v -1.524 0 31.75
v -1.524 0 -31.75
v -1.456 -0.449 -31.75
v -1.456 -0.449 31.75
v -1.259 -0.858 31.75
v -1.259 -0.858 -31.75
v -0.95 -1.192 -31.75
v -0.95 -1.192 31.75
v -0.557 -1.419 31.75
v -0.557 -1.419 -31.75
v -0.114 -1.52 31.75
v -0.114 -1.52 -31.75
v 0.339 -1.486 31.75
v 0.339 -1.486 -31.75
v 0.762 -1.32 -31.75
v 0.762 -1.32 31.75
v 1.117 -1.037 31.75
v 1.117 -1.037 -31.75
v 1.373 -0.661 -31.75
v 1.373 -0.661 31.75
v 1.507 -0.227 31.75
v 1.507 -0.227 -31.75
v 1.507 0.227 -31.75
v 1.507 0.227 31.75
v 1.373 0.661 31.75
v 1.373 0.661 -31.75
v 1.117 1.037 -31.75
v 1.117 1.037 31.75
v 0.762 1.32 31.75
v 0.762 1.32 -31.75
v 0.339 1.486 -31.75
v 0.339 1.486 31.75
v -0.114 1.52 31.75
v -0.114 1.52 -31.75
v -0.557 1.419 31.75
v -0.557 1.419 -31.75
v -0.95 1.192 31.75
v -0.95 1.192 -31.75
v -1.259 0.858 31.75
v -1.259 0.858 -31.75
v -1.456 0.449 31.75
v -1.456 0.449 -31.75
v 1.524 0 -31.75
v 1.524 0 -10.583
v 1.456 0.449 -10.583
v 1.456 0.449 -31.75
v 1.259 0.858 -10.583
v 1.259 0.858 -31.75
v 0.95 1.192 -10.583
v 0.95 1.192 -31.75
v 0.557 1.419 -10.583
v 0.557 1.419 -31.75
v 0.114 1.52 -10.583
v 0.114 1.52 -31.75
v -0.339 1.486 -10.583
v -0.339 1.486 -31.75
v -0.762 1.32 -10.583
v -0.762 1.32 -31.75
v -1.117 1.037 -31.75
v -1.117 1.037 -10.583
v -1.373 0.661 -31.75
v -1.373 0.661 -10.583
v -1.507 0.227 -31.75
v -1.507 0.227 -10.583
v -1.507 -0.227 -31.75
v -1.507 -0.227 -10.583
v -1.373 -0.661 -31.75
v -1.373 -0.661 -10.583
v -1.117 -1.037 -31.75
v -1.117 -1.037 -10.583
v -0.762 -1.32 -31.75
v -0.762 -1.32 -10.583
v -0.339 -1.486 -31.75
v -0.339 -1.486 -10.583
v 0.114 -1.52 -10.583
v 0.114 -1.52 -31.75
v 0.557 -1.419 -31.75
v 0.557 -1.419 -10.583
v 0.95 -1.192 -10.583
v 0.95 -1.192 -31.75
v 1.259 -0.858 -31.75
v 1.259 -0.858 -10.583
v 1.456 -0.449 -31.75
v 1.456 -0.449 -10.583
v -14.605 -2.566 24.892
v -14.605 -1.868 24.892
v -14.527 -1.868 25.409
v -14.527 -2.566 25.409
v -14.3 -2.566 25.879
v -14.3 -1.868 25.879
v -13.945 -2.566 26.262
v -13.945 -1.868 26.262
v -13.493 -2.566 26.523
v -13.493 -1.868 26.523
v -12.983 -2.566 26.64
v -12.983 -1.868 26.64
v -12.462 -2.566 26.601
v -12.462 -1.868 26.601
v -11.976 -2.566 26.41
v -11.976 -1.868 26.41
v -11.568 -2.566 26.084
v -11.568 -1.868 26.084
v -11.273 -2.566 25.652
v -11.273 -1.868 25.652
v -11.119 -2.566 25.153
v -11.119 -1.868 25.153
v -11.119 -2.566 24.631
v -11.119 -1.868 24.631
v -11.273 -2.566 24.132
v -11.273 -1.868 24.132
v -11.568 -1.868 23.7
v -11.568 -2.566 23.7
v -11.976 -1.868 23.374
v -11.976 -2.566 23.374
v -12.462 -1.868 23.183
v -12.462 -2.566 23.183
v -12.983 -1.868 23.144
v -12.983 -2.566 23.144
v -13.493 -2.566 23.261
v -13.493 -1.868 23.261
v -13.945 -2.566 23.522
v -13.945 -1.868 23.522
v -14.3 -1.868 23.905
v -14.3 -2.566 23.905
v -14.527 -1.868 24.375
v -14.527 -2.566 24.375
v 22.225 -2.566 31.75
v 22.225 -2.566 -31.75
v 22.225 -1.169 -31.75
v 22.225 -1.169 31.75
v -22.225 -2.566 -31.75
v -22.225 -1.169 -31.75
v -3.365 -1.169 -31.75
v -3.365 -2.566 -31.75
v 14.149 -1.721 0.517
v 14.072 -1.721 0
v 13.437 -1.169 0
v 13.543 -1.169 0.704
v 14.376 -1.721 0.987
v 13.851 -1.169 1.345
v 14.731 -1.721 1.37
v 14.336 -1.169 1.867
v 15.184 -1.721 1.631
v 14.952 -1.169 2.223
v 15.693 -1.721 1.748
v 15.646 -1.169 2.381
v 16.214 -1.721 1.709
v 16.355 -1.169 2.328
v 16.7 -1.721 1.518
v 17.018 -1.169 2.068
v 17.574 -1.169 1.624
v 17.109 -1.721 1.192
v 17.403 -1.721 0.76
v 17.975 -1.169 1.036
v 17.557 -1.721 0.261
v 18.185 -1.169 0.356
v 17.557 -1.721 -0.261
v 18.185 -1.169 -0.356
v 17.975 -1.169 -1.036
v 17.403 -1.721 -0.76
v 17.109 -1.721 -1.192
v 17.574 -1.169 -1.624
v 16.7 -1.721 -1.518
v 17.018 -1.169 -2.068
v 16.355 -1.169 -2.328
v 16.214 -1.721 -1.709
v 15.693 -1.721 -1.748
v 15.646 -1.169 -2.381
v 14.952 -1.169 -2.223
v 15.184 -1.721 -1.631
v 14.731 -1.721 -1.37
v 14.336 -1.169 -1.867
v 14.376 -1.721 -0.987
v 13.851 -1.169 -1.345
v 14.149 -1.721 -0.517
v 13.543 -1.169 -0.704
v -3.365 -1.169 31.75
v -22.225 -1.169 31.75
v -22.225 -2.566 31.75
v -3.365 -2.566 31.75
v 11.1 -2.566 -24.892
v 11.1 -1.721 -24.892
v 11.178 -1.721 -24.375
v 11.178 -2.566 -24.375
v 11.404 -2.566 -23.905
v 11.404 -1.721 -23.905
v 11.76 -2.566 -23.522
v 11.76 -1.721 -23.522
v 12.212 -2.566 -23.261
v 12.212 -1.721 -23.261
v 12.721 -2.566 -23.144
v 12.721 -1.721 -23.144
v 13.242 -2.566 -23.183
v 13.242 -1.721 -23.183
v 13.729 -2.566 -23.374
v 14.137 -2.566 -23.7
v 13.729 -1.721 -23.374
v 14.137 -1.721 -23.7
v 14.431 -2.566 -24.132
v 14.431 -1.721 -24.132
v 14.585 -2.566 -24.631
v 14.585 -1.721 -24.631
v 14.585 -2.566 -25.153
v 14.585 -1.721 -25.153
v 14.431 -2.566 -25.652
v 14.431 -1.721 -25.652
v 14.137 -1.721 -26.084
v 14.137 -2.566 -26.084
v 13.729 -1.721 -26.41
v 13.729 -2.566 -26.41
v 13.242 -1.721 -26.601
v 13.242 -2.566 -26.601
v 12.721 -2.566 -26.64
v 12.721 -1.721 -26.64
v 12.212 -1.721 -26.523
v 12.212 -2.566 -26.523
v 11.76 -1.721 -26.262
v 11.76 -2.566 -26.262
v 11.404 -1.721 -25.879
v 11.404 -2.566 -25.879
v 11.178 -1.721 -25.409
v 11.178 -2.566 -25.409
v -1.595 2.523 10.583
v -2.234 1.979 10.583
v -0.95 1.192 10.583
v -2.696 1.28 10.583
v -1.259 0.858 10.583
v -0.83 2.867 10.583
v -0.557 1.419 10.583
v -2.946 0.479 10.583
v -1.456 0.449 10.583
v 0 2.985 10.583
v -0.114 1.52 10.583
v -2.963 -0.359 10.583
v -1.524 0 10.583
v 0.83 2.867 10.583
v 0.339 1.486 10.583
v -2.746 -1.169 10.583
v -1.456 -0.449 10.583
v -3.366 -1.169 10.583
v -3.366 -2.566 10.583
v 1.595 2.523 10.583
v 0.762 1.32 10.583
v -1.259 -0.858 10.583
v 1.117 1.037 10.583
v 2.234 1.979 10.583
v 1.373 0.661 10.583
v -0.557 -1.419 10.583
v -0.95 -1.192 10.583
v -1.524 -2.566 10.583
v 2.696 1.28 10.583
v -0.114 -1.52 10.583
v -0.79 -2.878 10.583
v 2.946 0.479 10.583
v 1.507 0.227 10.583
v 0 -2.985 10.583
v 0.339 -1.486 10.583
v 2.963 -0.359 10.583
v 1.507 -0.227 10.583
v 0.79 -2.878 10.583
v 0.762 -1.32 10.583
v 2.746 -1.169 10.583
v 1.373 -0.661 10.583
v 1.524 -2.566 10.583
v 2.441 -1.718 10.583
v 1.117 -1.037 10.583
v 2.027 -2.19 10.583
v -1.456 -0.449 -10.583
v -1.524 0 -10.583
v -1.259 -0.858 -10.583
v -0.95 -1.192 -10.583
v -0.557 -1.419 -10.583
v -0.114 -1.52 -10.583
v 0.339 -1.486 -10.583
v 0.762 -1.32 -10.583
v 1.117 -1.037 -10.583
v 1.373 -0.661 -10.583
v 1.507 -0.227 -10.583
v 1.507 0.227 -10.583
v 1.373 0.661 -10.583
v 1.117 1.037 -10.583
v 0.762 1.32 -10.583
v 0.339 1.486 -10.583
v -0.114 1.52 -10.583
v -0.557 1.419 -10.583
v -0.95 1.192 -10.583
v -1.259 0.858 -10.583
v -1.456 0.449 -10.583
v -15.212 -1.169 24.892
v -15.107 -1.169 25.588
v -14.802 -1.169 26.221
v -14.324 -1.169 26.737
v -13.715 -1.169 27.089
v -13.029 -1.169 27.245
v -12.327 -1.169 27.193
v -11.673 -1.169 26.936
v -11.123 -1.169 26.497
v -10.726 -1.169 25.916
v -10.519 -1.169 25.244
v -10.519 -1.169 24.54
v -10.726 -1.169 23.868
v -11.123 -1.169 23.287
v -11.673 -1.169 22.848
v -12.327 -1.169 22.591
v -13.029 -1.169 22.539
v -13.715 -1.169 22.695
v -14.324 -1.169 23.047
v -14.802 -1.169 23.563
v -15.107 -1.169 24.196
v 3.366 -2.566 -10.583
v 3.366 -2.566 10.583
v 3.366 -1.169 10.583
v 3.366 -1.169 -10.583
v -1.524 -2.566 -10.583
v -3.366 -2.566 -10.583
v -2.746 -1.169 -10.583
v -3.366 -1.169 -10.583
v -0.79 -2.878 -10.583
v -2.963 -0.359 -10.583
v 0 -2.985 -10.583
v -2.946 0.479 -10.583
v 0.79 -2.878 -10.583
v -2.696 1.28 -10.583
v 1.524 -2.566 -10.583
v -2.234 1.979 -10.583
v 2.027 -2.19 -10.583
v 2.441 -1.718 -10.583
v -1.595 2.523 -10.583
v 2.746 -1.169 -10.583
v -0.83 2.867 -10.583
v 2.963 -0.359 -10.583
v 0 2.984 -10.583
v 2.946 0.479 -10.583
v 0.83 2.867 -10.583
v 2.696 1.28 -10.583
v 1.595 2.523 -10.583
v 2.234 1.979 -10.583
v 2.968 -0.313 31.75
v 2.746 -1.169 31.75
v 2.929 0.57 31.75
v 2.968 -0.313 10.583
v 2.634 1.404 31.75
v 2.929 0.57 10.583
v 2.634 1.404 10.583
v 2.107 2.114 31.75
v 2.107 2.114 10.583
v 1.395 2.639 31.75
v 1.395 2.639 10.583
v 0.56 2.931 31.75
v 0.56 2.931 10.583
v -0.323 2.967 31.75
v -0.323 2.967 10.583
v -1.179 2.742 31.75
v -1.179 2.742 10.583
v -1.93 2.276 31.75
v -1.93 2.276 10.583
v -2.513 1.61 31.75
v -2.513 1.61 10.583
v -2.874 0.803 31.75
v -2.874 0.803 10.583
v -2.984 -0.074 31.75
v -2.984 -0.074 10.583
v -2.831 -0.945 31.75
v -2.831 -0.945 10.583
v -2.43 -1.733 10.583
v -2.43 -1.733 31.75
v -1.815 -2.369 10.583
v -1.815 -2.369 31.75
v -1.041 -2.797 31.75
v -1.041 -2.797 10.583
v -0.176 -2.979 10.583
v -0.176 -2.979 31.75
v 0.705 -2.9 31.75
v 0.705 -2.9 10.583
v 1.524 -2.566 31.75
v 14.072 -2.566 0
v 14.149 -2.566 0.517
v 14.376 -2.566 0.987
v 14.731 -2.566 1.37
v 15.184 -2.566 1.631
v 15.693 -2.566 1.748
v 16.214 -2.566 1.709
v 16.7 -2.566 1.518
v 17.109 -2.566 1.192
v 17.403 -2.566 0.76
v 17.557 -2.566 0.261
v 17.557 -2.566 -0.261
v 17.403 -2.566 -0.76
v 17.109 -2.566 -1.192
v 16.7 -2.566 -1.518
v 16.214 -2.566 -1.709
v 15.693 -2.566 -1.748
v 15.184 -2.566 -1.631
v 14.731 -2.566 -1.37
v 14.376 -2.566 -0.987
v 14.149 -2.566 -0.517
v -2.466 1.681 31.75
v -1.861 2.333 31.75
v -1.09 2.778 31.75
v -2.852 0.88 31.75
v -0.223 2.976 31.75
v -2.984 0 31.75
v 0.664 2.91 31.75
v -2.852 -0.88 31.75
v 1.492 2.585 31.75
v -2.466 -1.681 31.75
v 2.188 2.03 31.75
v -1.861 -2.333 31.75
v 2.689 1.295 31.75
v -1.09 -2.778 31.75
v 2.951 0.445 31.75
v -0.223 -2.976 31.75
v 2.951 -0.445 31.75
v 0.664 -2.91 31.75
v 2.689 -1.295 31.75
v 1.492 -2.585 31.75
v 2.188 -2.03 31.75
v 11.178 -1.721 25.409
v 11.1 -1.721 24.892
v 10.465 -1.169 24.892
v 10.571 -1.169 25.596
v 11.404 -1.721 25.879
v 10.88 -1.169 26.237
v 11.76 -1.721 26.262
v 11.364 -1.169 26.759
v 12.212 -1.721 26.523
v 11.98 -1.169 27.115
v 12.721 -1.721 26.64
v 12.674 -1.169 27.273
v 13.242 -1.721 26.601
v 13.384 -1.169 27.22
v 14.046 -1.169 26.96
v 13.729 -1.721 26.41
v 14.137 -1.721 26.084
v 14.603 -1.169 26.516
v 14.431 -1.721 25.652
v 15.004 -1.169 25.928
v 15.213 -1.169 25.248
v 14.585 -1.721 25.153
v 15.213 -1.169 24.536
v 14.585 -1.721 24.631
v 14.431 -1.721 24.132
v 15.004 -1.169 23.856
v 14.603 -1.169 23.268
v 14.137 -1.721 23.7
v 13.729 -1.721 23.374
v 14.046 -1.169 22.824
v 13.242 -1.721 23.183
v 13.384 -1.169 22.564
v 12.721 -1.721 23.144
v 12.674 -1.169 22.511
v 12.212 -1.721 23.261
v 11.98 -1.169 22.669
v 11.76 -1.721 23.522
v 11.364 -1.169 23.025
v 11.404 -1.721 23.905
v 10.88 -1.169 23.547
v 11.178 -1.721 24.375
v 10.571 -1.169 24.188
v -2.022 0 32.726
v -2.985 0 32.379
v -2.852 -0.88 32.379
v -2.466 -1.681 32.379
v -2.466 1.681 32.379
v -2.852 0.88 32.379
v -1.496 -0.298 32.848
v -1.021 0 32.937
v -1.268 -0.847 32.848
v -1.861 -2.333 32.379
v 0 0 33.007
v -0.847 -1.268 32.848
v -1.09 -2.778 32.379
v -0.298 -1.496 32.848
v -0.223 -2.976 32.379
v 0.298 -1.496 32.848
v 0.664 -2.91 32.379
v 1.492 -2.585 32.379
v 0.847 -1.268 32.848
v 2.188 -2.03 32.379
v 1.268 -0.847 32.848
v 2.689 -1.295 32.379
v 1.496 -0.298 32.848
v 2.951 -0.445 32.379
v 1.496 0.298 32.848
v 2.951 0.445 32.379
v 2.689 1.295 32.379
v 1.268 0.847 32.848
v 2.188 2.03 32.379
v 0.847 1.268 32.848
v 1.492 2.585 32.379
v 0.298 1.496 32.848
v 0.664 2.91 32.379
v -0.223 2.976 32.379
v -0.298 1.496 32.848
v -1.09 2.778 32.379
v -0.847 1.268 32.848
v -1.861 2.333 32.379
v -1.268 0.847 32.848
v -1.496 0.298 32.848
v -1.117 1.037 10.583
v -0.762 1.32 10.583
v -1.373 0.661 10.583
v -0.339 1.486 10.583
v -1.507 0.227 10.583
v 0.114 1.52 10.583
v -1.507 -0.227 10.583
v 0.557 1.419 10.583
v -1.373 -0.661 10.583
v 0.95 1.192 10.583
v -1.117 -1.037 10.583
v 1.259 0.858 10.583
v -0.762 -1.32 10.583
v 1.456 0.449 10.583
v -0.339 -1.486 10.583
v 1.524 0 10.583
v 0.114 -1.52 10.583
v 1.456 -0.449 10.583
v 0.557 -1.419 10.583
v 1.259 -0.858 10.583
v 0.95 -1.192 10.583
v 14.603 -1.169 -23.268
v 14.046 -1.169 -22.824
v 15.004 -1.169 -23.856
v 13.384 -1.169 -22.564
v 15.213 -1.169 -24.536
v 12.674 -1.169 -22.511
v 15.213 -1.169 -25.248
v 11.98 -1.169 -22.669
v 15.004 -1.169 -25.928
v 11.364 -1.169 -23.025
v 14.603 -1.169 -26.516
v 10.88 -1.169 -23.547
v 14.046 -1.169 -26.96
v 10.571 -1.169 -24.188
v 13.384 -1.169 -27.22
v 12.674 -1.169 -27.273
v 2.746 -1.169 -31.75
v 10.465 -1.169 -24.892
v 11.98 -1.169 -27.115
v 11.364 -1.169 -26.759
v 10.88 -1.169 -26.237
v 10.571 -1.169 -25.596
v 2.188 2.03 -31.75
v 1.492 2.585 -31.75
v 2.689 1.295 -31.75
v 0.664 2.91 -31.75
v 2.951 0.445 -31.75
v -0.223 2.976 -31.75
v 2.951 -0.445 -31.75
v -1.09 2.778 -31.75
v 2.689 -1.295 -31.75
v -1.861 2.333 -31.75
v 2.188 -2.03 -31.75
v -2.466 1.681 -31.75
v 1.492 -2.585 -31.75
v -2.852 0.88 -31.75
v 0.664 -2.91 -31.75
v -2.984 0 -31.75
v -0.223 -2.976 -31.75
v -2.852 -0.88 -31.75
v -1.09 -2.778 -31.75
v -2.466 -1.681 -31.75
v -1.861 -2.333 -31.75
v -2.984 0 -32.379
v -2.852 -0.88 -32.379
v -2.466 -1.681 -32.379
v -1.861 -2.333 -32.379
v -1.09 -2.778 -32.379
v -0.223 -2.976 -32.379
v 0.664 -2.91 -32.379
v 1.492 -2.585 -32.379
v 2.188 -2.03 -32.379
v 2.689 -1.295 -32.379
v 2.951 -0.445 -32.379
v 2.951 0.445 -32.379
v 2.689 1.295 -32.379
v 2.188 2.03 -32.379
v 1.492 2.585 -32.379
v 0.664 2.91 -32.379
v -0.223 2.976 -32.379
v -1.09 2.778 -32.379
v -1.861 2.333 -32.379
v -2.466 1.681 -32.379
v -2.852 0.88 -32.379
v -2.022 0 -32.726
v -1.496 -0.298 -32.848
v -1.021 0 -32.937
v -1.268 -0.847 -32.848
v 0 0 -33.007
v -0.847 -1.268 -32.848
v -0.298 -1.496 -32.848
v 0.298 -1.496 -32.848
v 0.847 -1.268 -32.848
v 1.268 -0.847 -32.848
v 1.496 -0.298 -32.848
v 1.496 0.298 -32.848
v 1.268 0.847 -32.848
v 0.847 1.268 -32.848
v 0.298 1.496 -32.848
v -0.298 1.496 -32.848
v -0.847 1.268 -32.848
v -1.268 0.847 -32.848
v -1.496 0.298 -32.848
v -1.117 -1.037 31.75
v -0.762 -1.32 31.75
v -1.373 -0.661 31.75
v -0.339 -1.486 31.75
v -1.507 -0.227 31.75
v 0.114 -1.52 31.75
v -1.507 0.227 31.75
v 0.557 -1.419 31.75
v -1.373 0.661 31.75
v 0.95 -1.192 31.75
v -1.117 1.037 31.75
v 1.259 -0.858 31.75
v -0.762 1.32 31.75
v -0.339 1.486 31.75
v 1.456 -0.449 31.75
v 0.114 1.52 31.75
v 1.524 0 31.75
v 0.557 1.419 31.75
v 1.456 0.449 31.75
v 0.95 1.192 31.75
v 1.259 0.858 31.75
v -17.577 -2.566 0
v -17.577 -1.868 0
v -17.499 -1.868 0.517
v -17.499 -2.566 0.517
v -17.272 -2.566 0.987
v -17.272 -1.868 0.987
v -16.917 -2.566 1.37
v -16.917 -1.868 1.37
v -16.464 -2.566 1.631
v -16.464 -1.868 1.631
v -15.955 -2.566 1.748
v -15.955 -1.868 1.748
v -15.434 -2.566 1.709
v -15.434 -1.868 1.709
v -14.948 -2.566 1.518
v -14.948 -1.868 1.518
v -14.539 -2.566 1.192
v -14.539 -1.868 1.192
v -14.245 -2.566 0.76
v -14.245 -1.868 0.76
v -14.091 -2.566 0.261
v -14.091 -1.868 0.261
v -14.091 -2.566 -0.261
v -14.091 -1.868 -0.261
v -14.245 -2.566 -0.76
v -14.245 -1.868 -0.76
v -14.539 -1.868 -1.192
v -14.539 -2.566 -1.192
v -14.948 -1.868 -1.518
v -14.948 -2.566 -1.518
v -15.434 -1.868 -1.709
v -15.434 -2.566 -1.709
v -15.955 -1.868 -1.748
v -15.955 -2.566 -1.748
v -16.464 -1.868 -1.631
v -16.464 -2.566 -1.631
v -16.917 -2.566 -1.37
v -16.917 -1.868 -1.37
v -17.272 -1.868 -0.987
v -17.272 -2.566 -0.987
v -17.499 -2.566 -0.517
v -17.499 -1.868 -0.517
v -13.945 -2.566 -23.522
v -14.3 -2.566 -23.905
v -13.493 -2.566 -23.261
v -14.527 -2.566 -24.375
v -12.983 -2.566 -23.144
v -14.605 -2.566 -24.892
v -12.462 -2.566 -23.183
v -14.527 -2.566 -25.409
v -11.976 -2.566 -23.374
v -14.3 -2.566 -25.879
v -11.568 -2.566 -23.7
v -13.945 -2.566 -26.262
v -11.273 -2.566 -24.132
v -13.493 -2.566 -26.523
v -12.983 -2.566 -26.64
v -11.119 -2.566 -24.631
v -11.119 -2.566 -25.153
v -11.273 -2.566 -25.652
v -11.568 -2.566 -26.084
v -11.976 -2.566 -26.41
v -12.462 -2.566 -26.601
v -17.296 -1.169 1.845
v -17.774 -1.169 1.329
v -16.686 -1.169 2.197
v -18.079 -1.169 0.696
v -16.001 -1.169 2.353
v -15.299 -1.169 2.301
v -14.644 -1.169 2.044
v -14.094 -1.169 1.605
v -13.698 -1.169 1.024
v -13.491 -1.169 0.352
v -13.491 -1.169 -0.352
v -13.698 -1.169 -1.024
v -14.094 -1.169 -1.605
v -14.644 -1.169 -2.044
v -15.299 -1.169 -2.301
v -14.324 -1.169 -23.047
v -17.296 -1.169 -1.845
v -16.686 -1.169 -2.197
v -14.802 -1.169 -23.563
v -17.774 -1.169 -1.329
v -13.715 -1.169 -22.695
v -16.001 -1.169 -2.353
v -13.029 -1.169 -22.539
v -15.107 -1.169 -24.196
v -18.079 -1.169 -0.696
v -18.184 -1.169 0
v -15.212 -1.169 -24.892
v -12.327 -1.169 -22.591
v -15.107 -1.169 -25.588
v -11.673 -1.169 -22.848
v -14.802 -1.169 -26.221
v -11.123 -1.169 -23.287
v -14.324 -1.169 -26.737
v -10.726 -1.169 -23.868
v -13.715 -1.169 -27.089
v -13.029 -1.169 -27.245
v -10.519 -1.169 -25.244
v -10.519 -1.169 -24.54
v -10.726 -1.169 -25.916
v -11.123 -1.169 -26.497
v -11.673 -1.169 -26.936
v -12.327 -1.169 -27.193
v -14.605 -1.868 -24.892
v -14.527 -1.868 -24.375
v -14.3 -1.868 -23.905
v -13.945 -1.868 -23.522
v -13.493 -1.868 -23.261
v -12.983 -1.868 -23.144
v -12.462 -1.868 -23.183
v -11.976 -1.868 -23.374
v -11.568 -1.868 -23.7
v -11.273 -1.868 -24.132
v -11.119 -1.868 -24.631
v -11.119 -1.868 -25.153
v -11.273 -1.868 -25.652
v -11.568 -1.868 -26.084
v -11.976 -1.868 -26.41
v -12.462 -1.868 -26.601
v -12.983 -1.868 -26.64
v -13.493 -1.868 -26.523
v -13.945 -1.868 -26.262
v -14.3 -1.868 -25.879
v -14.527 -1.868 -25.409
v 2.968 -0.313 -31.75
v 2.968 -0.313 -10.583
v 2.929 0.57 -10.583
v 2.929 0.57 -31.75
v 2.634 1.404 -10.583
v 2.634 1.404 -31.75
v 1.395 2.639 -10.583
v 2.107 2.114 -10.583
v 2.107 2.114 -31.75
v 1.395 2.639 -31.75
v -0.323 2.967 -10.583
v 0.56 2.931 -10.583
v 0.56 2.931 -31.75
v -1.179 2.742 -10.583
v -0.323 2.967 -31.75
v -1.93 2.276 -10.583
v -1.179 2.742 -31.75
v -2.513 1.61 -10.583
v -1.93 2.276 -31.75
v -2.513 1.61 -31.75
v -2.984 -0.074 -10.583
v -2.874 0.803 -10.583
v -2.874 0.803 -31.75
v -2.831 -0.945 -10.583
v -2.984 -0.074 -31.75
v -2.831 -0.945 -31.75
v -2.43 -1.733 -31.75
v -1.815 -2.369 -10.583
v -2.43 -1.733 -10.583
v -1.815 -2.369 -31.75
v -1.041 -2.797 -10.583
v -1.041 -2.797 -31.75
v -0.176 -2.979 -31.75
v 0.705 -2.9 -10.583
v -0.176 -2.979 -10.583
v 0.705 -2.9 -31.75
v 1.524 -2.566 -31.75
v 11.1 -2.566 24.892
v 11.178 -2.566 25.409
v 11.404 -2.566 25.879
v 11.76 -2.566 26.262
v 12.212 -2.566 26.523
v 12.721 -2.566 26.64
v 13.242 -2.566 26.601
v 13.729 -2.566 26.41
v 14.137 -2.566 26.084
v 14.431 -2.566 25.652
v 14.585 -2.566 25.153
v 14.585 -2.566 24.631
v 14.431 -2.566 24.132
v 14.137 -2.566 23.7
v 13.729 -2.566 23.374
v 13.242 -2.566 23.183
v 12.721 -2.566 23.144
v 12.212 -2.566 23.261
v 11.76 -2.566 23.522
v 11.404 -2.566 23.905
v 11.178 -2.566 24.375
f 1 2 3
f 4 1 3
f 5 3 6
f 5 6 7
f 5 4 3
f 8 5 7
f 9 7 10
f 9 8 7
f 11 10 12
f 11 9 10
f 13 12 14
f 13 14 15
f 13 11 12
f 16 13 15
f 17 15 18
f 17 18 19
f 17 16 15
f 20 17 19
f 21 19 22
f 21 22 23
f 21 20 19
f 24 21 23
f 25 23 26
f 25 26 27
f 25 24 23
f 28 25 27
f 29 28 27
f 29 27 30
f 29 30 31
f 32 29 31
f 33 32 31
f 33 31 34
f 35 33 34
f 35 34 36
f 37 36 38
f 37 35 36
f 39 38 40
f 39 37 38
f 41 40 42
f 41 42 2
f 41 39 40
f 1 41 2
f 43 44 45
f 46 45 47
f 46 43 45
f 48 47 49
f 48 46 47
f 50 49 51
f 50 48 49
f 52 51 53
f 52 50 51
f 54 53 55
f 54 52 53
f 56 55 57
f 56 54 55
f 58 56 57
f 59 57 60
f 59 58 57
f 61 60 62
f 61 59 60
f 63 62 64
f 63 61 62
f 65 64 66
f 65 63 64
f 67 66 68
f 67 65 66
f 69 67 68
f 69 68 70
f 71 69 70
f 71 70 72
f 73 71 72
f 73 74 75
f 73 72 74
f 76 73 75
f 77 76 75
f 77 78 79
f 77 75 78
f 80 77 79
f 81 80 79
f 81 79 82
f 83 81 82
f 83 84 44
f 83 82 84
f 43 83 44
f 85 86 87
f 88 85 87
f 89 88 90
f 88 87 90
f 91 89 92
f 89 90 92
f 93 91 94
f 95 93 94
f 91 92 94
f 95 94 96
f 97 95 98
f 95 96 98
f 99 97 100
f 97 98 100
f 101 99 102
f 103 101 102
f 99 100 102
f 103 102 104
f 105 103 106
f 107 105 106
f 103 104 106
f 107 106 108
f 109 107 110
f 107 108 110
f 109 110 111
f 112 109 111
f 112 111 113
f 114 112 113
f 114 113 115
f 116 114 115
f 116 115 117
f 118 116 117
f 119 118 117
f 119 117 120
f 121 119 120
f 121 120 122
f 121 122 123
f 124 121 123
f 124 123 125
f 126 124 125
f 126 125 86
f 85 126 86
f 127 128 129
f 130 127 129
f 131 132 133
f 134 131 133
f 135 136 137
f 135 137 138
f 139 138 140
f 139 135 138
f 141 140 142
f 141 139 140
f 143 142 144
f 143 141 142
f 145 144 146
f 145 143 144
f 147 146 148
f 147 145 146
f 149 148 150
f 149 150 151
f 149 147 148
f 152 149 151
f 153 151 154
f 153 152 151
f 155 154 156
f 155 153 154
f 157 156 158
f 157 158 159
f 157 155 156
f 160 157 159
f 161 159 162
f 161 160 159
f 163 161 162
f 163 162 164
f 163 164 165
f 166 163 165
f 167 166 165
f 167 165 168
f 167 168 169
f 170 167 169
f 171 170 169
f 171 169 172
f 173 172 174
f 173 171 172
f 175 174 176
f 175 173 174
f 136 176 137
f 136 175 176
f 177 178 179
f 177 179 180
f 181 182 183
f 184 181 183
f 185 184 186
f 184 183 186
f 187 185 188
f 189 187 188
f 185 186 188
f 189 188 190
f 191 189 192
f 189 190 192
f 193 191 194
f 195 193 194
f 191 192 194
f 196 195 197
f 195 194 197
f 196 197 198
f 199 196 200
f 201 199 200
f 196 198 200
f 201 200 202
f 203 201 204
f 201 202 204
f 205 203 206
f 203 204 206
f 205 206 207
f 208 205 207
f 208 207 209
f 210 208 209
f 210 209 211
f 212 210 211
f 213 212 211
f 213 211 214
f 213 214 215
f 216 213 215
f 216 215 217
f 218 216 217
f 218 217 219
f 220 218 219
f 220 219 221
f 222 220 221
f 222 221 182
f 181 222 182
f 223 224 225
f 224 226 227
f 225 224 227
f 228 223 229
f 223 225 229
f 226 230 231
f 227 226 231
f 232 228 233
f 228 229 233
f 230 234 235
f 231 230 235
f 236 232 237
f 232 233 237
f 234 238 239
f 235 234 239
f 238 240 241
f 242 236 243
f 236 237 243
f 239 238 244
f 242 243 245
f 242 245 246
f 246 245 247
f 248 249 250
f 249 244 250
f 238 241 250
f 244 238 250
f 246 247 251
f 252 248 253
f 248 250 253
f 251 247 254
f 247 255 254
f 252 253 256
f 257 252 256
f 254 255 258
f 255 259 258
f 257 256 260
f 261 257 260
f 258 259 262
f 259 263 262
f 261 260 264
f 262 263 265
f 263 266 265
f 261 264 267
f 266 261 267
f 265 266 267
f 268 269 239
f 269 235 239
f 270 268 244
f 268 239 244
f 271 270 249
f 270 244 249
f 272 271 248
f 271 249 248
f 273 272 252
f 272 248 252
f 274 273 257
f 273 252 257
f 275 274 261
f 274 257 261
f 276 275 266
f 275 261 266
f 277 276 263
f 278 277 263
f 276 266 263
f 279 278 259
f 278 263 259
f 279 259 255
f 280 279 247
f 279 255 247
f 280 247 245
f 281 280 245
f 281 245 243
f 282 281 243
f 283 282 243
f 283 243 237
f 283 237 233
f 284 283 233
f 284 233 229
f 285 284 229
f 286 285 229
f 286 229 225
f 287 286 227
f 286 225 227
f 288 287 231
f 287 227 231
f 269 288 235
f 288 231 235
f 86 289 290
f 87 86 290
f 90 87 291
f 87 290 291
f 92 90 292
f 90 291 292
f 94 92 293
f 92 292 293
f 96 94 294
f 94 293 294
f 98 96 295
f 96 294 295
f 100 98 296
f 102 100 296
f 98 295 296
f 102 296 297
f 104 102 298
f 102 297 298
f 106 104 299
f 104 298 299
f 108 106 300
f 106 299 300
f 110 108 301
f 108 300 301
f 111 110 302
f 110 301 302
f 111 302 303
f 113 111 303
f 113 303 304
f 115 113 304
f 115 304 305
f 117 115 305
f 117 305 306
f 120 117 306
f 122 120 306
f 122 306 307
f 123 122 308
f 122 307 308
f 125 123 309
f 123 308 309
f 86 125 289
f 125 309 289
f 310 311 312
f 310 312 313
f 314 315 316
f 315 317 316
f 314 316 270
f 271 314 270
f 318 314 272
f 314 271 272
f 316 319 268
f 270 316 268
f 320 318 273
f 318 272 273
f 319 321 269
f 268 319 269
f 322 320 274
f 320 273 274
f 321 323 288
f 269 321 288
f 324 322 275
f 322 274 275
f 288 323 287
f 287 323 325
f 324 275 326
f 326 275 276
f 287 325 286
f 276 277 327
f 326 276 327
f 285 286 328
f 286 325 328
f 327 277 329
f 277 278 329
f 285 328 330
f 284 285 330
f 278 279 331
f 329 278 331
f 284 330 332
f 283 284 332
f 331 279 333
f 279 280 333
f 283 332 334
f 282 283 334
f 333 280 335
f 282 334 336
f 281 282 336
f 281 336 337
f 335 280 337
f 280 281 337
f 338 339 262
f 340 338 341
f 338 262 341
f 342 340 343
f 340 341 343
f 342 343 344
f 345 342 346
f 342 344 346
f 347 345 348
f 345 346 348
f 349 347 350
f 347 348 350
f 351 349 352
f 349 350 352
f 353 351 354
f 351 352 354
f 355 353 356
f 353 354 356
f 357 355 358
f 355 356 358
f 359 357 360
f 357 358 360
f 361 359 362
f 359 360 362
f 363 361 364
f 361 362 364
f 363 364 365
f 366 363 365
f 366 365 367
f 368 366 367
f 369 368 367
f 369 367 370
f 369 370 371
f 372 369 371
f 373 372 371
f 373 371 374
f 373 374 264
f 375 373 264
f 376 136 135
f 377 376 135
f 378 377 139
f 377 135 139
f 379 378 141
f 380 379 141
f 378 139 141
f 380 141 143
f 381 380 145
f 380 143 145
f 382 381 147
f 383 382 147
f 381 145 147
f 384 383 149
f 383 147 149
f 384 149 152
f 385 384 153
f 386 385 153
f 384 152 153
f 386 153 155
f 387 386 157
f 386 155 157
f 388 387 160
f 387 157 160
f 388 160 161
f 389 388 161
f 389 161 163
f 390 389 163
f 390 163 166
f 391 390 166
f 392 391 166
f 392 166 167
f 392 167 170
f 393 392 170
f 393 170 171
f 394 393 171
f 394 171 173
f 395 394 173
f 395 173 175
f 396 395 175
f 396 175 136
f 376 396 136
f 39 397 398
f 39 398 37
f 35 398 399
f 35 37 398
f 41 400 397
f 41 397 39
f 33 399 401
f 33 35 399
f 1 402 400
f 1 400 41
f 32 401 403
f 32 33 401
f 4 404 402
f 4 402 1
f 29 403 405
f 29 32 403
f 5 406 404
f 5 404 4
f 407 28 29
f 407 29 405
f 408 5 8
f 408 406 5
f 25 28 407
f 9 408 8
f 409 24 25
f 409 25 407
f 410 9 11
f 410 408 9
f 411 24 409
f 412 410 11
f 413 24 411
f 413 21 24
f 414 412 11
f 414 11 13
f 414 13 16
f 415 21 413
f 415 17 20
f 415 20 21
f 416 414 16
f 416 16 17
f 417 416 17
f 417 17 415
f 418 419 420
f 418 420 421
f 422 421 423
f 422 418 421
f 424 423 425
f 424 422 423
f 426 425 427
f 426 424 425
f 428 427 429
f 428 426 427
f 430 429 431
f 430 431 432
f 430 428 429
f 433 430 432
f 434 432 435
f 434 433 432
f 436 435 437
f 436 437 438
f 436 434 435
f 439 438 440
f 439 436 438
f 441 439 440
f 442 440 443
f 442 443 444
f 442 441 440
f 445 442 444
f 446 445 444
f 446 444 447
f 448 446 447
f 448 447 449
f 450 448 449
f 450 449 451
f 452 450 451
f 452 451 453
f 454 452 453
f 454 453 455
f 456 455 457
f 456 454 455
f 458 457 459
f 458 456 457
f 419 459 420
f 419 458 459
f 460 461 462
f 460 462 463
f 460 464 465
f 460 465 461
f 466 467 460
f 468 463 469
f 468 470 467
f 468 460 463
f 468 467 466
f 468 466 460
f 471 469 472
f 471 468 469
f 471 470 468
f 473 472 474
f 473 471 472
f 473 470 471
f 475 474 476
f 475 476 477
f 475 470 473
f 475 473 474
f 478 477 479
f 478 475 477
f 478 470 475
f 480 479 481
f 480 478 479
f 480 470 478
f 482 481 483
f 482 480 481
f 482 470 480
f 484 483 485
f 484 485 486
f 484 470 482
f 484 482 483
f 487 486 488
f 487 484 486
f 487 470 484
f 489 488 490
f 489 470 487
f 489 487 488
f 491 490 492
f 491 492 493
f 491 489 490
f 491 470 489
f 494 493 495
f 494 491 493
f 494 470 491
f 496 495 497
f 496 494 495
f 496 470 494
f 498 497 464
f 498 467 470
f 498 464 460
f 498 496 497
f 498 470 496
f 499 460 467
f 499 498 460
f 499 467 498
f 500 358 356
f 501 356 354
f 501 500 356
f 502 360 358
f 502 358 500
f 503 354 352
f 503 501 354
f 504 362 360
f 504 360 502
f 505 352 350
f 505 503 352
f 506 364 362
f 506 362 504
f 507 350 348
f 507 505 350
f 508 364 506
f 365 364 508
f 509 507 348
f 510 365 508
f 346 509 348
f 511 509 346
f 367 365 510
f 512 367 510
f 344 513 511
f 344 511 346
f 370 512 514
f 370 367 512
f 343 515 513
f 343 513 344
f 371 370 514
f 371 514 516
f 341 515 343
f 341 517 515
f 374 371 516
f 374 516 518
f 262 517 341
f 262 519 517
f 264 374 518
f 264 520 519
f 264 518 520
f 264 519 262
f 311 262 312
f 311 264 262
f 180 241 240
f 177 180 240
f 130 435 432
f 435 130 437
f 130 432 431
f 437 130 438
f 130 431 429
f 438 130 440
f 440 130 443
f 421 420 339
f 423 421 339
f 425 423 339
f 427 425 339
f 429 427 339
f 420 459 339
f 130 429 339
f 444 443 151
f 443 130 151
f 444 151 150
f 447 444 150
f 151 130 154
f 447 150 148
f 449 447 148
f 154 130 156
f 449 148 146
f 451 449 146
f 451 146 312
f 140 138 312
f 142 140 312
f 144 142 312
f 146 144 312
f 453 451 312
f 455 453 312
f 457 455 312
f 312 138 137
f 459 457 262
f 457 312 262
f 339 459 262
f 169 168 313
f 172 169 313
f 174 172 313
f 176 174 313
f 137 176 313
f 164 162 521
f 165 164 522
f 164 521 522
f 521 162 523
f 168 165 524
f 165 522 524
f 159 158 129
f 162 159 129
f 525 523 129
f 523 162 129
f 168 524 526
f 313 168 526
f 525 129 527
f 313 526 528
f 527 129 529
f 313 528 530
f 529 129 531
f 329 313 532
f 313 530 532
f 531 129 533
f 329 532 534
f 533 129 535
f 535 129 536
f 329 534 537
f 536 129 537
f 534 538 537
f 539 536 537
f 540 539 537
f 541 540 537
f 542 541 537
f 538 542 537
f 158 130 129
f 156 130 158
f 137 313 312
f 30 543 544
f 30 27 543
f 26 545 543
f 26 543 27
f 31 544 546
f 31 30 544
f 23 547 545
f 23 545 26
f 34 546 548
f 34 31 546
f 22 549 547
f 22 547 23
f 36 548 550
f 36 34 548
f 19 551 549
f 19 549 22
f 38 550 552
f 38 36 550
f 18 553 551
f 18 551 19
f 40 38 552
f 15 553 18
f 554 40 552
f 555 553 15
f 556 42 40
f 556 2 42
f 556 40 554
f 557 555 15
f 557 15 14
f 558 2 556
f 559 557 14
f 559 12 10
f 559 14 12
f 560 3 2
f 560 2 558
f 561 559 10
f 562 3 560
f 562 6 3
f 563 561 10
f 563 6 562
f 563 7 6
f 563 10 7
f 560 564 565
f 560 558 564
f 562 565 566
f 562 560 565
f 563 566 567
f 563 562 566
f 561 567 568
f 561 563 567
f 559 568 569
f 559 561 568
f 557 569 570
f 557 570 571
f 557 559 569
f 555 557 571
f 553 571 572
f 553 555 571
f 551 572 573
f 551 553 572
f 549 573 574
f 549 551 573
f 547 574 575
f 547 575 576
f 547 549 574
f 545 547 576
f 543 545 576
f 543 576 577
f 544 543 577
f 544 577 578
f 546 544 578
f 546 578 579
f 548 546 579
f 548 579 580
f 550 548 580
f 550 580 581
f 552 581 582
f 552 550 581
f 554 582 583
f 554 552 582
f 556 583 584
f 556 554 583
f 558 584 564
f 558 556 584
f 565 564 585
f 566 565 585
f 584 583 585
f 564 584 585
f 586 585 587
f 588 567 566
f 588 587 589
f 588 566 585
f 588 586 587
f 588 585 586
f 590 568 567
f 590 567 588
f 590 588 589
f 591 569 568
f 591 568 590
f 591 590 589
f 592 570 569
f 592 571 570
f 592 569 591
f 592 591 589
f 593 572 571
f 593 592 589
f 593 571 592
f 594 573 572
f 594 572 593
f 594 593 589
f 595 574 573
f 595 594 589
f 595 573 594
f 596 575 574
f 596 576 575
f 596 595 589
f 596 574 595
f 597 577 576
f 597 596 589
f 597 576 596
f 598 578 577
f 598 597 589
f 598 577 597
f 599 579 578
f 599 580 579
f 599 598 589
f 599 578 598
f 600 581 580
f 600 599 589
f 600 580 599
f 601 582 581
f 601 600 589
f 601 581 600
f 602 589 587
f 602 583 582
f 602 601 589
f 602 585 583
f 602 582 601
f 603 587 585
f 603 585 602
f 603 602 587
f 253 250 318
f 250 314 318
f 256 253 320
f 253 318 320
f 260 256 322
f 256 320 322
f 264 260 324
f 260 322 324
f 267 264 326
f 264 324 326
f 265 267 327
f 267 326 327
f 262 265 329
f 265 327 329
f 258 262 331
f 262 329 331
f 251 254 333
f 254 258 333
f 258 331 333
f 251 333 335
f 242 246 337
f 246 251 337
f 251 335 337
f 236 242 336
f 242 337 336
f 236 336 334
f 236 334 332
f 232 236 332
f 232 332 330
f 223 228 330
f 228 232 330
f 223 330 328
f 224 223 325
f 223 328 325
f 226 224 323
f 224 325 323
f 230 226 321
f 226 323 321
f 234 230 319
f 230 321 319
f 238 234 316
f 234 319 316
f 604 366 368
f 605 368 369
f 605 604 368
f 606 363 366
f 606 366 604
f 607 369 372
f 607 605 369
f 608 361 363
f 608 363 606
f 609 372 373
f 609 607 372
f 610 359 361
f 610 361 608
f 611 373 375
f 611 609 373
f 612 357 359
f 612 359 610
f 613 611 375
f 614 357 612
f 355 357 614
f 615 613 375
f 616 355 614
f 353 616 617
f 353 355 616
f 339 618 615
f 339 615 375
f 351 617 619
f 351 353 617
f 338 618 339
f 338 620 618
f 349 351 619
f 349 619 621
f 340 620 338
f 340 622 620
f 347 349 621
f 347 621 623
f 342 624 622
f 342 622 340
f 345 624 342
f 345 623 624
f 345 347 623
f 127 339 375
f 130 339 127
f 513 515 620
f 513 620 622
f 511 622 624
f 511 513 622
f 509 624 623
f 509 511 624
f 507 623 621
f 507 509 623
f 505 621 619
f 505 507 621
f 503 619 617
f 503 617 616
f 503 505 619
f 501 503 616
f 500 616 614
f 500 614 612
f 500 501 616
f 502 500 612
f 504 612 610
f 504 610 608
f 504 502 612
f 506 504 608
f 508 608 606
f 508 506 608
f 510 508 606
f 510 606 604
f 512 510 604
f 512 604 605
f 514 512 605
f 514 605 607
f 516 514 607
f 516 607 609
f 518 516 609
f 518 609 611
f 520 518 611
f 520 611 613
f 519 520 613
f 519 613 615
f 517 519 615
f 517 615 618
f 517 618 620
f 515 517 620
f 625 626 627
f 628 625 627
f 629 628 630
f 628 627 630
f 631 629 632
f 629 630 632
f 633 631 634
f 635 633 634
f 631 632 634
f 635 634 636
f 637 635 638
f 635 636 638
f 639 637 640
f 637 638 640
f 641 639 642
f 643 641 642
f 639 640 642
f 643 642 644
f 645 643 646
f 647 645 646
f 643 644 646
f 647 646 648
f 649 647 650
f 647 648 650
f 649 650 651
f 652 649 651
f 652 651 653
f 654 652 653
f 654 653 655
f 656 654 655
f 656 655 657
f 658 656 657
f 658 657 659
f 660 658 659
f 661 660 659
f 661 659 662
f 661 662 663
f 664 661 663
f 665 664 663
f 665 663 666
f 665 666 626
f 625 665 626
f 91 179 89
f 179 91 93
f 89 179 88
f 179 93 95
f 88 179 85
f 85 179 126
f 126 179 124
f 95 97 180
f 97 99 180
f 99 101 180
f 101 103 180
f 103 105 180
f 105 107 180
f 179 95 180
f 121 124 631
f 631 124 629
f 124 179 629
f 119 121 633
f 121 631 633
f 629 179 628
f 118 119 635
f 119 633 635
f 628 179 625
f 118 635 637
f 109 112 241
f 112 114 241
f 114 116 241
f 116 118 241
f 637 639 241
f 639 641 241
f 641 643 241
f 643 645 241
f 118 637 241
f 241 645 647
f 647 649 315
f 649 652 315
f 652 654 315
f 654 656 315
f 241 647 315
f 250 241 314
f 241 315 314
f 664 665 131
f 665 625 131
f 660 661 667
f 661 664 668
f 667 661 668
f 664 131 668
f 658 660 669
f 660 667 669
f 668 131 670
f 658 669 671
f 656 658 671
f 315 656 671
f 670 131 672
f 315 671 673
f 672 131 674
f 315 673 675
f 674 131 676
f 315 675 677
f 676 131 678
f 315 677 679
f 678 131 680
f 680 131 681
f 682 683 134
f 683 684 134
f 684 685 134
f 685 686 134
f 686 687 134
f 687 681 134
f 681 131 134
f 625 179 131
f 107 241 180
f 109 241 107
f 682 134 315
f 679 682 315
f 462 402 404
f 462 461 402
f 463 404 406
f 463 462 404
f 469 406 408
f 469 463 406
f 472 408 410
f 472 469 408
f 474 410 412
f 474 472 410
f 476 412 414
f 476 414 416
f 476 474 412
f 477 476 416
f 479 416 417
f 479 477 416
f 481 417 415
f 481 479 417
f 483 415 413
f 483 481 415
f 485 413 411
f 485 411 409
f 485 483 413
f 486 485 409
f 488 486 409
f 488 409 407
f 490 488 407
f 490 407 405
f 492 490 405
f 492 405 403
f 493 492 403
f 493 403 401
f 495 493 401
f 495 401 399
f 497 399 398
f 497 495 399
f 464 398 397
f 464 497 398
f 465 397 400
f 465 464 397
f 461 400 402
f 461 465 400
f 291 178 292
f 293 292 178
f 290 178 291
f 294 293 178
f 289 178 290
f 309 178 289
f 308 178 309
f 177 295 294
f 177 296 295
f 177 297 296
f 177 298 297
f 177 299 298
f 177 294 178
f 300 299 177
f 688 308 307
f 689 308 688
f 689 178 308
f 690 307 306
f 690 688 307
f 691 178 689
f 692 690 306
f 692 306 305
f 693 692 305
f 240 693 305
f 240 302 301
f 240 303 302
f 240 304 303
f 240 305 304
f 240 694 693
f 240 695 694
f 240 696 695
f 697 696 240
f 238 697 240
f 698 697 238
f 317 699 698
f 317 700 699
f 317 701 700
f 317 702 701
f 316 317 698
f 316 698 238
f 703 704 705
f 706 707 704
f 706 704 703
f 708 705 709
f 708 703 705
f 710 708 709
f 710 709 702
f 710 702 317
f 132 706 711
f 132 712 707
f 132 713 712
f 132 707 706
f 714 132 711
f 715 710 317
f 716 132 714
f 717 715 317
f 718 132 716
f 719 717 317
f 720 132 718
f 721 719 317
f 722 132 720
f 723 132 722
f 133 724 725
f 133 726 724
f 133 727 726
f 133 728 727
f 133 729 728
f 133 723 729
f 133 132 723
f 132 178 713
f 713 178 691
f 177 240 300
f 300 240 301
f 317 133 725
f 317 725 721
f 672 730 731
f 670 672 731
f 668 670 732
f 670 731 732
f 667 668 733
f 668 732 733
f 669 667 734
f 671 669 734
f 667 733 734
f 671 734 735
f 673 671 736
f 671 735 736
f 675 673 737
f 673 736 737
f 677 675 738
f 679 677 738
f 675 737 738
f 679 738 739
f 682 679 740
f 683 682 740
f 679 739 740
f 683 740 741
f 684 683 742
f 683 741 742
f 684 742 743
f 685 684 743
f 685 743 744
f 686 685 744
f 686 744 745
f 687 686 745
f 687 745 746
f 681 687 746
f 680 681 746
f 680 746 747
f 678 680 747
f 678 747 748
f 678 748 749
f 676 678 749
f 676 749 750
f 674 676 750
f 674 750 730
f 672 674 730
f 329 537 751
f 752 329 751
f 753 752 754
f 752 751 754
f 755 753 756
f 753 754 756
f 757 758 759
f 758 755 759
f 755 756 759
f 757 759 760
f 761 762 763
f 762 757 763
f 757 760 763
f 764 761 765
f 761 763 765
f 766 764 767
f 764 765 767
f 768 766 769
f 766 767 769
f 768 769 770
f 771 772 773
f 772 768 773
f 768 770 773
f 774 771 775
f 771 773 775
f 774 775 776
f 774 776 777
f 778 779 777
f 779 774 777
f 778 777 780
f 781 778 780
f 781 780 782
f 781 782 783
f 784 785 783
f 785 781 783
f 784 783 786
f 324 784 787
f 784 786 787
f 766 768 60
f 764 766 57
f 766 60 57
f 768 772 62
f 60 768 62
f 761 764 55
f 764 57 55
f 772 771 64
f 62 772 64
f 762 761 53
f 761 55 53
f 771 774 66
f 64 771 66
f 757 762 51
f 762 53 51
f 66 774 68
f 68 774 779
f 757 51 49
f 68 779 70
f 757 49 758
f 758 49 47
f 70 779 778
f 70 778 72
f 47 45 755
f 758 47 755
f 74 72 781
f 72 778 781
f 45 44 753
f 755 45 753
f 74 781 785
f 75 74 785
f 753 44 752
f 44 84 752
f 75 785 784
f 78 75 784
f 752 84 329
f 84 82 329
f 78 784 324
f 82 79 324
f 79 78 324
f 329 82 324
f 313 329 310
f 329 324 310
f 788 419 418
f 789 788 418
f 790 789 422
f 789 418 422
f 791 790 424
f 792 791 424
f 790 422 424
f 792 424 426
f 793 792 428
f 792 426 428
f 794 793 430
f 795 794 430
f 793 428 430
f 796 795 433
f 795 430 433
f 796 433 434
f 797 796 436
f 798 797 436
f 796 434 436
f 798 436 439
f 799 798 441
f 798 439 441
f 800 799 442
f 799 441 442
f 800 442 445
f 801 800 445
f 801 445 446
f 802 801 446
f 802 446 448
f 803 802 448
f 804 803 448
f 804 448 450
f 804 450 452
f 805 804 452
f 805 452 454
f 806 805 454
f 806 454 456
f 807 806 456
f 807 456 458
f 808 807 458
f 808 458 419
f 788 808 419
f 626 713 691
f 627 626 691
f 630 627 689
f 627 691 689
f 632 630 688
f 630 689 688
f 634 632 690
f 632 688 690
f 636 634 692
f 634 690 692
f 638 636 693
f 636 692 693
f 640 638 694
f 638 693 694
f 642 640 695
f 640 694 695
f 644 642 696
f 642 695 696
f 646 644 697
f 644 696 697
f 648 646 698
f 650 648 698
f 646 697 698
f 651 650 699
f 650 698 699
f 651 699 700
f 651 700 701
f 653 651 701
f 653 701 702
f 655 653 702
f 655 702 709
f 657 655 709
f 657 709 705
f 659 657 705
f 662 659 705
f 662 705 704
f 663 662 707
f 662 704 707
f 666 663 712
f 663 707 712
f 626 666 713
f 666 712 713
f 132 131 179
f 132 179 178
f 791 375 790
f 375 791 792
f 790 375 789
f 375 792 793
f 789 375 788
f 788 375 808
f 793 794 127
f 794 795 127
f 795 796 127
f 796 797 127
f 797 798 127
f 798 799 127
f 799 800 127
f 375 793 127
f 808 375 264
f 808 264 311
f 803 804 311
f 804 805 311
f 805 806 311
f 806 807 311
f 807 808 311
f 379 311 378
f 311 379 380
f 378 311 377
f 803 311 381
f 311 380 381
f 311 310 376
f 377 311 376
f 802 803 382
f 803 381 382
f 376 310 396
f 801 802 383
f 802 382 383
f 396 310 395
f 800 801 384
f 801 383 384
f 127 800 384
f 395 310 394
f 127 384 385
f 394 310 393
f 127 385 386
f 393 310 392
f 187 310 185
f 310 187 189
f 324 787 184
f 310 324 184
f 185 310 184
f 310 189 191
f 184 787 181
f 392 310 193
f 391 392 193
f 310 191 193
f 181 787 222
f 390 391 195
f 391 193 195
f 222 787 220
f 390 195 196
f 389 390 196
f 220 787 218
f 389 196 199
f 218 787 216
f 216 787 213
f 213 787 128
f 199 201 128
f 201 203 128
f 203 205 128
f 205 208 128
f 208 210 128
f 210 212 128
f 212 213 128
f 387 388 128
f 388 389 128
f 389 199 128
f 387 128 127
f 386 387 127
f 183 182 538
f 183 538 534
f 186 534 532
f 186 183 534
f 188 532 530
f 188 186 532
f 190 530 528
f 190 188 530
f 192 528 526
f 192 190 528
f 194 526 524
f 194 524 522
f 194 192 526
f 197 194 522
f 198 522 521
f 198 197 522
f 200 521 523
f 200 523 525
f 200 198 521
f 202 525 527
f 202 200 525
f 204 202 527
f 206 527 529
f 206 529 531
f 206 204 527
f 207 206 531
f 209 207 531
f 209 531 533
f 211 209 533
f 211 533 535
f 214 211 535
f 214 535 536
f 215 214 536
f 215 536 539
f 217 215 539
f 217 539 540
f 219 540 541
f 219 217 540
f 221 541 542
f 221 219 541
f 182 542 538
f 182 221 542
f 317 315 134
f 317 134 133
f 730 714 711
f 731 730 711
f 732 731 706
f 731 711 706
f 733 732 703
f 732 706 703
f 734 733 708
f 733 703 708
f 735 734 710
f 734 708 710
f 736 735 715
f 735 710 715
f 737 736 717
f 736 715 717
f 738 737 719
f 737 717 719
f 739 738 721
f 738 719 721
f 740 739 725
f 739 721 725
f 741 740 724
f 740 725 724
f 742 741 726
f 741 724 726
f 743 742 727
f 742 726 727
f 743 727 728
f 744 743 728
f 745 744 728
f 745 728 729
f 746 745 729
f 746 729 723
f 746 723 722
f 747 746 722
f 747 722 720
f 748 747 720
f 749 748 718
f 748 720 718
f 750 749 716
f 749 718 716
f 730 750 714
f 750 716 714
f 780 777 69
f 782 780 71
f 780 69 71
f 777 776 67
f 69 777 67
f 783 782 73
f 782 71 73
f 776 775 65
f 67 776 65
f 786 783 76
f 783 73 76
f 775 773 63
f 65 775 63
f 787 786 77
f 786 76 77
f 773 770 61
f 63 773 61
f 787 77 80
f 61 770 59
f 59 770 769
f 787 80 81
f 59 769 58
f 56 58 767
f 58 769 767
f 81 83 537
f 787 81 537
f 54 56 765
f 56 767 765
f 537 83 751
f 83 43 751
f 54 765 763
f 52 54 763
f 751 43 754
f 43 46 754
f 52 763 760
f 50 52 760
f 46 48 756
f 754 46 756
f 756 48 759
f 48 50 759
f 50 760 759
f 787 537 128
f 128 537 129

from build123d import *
from OCP.BRepFilletAPI import BRepFilletAPI_MakeChamfer

# Parameters (mm, degrees)
BOSS_EXTRUDE1_DEPTH             = 31.75
BOSS_EXTRUDE1_DEPTH_BACK        = 31.75
SKETCH4_W                       = 18.8595
SKETCH4_H                       = 1.397
BOSS_EXTRUDE1_2_DEPTH           = 31.75
BOSS_EXTRUDE1_2_DEPTH_BACK      = 31.75
SKETCH4_R                       = 1.524
SKETCH6_R                       = 1.7526
CUT_EXTRUDE1_DEPTH              = 2.54
CHAMFER1_SIZE                   = 0.6985
CHAMFER1_SIZE2                  = 0.607196786
CHAMFER2_SIZE                   = 0.635
CHAMFER2_SIZE2                  = 0.551997079
CUT_EXTRUDE2_DEPTH              = 41.008555829
CUT_EXTRUDE2_DEPTH_BACK         = 41.008555829
SKETCH8_W                       = 6.731
SKETCH8_H                       = 21.166666666
BOSS_EXTRUDE2_REACH             = 41.904
SKETCH9_R                       = 1.524
BOSS_EXTRUDE2_DIRECTION_2_REACH = 41.904


with BuildPart() as part:
    # Sketch4 → Boss-Extrude1 (new, two sides: drawn at the far end of the back side and taken through both)
    with BuildSketch(Plane.XY.offset(-BOSS_EXTRUDE1_DEPTH_BACK)):
        with Locations((-12.79525, -1.867560064)):
            Rectangle(SKETCH4_W, SKETCH4_H)
    extrude(amount=BOSS_EXTRUDE1_DEPTH + BOSS_EXTRUDE1_DEPTH_BACK)


with BuildPart() as body_2:
    # Sketch4 → Boss-Extrude1 2 (new, two sides: drawn at the far end of the back side and taken through both)
    with BuildSketch(Plane.XY.offset(-BOSS_EXTRUDE1_2_DEPTH_BACK)):
        with BuildLine():
            Line((22.225, -2.566060064), (22.225, -1.169060064))
            Line((22.225, -1.169060064), (2.746004155, -1.169060064))
            ThreePointArc((2.746004155, -1.169060064), (-2.246360639, 1.964969244), (1.524, -2.566060064))
            Line((1.524, -2.566060064), (22.225, -2.566060064))
        make_face()
        Circle(SKETCH4_R, mode=Mode.SUBTRACT)
    extrude(amount=BOSS_EXTRUDE1_2_DEPTH + BOSS_EXTRUDE1_2_DEPTH_BACK)


with BuildPart() as body_3:
    # Sketch5 → Revolve1 (revolve)
    with BuildSketch(Plane(origin=(0, 0, 0), x_dir=(1, 0, 0), z_dir=(0, 1, 0))):
        with BuildLine():
            Line((-2.9845, -31.75), (-2.9845, -32.37865))
            ThreePointArc((-2.9845, -32.37865), (-1.52499517, -32.848431867), (0, -33.0073))
            Line((0, -33.0073), (0, 33.0073))
            ThreePointArc((0, 33.0073), (-1.52499517, 32.848431867), (-2.9845, 32.37865))
            Line((-2.9845, 32.37865), (-2.9845, 31.75))
            Line((-2.9845, 31.75), (-1.524, 31.75))
            Line((-1.524, 31.75), (-1.524, -31.75))
            Line((-1.524, -31.75), (-2.9845, -31.75))
        make_face()
    revolve(axis=Axis((0, 0, -33.0073), (0, 0, 1)))


with BuildPart() as cut_extrude1_tool:
    # Sketch6 → Cut-Extrude1 (new body)
    with BuildSketch(Plane(origin=(0, -1.169060064, 0), x_dir=(1, 0, 0), z_dir=(0, 1, 0))):
        with Locations(Location((-12.8524, 24.892, 0), (0, 0, 180))):
            Circle(SKETCH6_R)
        with Locations(Location((-12.8524, -24.892, 0), (0, 0, 180))):
            Circle(SKETCH6_R)
        with Locations(Location((12.8524, -24.892, 0), (0, 0, 180))):
            Circle(SKETCH6_R)
        with Locations(Location((12.8524, 24.892, 0), (0, 0, 180))):
            Circle(SKETCH6_R)
        with Locations(Location((15.8242, 0, 0), (0, 0, 180))):
            Circle(SKETCH6_R)
        with Locations(Location((-15.8242, 0, 0), (0, 0, 180))):
            Circle(SKETCH6_R)
    extrude(amount=-CUT_EXTRUDE1_DEPTH)


with BuildPart() as part_1:
    add(part.part)

    # Cut-Extrude1: cut by cut_extrude1_tool
    add(cut_extrude1_tool.part, mode=Mode.SUBTRACT)

    # Chamfer1: one chamfer whose edges measure the first distance from different faces: ONE call of the kernel's chamfer builder (chamfer() names one face for all edges)
    chamfer1_edges_1 = [part_1.edges().sort_by_distance(p)[0] for p in [
        (-11.0998, -1.169060064, -24.892),
    ]]
    chamfer1_side_1 = [part_1.faces().sort_by_distance(p)[0] for p in [
        (-11.0998, -1.867560064, -24.892),
    ]]
    chamfer1_edges_2 = [part_1.edges().sort_by_distance(p)[0] for p in [
        (-11.0998, -1.169060064, 24.892),
    ]]
    chamfer1_side_2 = [part_1.faces().sort_by_distance(p)[0] for p in [
        (-11.0998, -1.867560064, 24.892),
    ]]
    chamfer1_edges_3 = [part_1.edges().sort_by_distance(p)[0] for p in [
        (-14.0716, -1.169060064, 0),
    ]]
    chamfer1_side_3 = [part_1.faces().sort_by_distance(p)[0] for p in [
        (-14.0716, -1.867560064, 0),
    ]]
    chamfer1 = BRepFilletAPI_MakeChamfer(part_1.part.solid().wrapped)
    for e in chamfer1_edges_1:
        chamfer1.Add(CHAMFER1_SIZE, CHAMFER1_SIZE2, e.wrapped, chamfer1_side_1[0].wrapped)  # the first distance lies on this face
    for e in chamfer1_edges_2:
        chamfer1.Add(CHAMFER1_SIZE, CHAMFER1_SIZE2, e.wrapped, chamfer1_side_2[0].wrapped)  # the first distance lies on this face
    for e in chamfer1_edges_3:
        chamfer1.Add(CHAMFER1_SIZE, CHAMFER1_SIZE2, e.wrapped, chamfer1_side_3[0].wrapped)  # the first distance lies on this face
    add(Compound.cast(chamfer1.Shape()), mode=Mode.REPLACE)


with BuildPart() as body_2_1:
    add(body_2.part)

    # Cut-Extrude1: cut by cut_extrude1_tool
    add(cut_extrude1_tool.part, mode=Mode.SUBTRACT)

    # Chamfer2
    chamfer2_edges = [body_2_1.edges().sort_by_distance(p)[0] for p in [
        (14.605, -1.169060064, 24.892),
        (14.605, -1.169060064, -24.892),
        (17.5768, -1.169060064, 0),
    ]]
    chamfer2_side = [body_2_1.faces().sort_by_distance(p)[0] for p in [
        (12.452969323, -1.169060064, 0),
    ]]
    chamfer(chamfer2_edges, length=CHAMFER2_SIZE, length2=CHAMFER2_SIZE2, reference=chamfer2_side[0])

    # Sketch8 → Cut-Extrude2 (cut, two sides: drawn at the far end of the back side and taken through both)
    with BuildSketch(Plane(origin=(0, -1.169060064, 0), x_dir=(1, 0, 0), z_dir=(0, 1, 0)).offset(-CUT_EXTRUDE2_DEPTH_BACK)):
        Rectangle(SKETCH8_W, SKETCH8_H)
    extrude(amount=CUT_EXTRUDE2_DEPTH + CUT_EXTRUDE2_DEPTH_BACK, mode=Mode.SUBTRACT)


with BuildPart() as body_4:

    # Boss-Extrude2: up to this face of the body (flat: up to its plane)
    boss_extrude2_end = Plane(body_2_1.part.faces().sort_by_distance((3.055752077, -1.256210199, -10.583333333))[0])
    # Sketch9 → Boss-Extrude2 (new, up to the picked face)
    with BuildSketch(Plane.XY, mode=Mode.PRIVATE) as boss_extrude2_sk1:
        with BuildLine():
            Line((-3.3655, -2.566060064), (-1.524, -2.566060064))
            ThreePointArc((-1.524, -2.566060064), (0, -2.9845), (1.524, -2.566060064))
            ThreePointArc((1.524, -2.566060064), (2.246360639, -1.964969244), (2.746004155, -1.169060064))
            ThreePointArc((2.746004155, -1.169060064), (0, 2.9845), (-2.746004155, -1.169060064))
            Line((-2.746004155, -1.169060064), (-3.3655, -1.169060064))
            Line((-3.3655, -1.169060064), (-3.3655, -2.566060064))
        make_face()
        with Locations(Location((0, 0, 0), (0, 0, 180))):
            Circle(SKETCH9_R, mode=Mode.SUBTRACT)
    boss_extrude2_tool1 = split(extrude(boss_extrude2_sk1.sketch, amount=-BOSS_EXTRUDE2_REACH, mode=Mode.PRIVATE), bisect_by=boss_extrude2_end, keep=Keep.BOTH, mode=Mode.PRIVATE)
    add(boss_extrude2_tool1.solids().sort_by(Axis((-3.055752, -1.25621, 0), (0, 0, -1)))[0])


    # Boss-Extrude2 direction 2: up to this face of the body (flat: up to its plane)
    boss_extrude2_direction_2_end = Plane(body_2_1.part.faces().sort_by_distance((3.278349865, -1.867560064, 10.583333333))[0])
    # Sketch9 → Boss-Extrude2 direction 2 (add, up to the picked face)
    with BuildSketch(Plane.XY, mode=Mode.PRIVATE) as boss_extrude2_direction_2_sk1:
        with BuildLine():
            Line((-3.3655, -2.566060064), (-1.524, -2.566060064))
            ThreePointArc((-1.524, -2.566060064), (0, -2.9845), (1.524, -2.566060064))
            ThreePointArc((1.524, -2.566060064), (2.246360639, -1.964969244), (2.746004155, -1.169060064))
            ThreePointArc((2.746004155, -1.169060064), (0, 2.9845), (-2.746004155, -1.169060064))
            Line((-2.746004155, -1.169060064), (-3.3655, -1.169060064))
            Line((-3.3655, -1.169060064), (-3.3655, -2.566060064))
        make_face()
        with Locations(Location((0, 0, 0), (0, 0, 180))):
            Circle(SKETCH9_R, mode=Mode.SUBTRACT)
    boss_extrude2_direction_2_tool1 = split(extrude(boss_extrude2_direction_2_sk1.sketch, amount=BOSS_EXTRUDE2_DIRECTION_2_REACH, mode=Mode.PRIVATE), bisect_by=boss_extrude2_direction_2_end, keep=Keep.BOTH, mode=Mode.PRIVATE)
    add(boss_extrude2_direction_2_tool1.solids().sort_by(Axis((-3.055752, -1.25621, 0), (0, 0, 1)))[0])

    # Combine1: union part
    add(part_1.part)


solid = Compound([body_3.part, body_2_1.part, body_4.part])
